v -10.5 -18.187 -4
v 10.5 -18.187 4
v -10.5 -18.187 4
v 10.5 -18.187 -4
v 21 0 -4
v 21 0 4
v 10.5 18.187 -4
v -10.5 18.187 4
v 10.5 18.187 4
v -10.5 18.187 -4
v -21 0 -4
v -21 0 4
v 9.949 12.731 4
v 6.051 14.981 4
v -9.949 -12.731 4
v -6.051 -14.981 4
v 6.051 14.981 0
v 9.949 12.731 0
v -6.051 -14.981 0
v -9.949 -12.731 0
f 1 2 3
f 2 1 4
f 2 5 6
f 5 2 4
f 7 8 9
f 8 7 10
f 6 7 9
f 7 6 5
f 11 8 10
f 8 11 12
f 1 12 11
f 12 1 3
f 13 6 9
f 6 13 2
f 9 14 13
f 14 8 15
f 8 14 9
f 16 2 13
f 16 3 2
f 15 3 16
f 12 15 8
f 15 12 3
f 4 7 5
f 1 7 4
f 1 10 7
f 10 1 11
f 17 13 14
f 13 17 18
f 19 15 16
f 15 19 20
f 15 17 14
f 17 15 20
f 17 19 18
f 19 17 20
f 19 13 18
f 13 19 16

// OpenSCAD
difference() {
	translate(v = [0, 0, 0]) {
		rotate(a = [0, 0, 0]) {
			cylinder($fn = 6, center = true, h = 8, r1 = 21, r2 = 21);
		}
	}
	translate(v = [0, 0, 4.0000000000]) {
		rotate(a = [0, 0, 60]) {
			cube(center = true, size = [32.0000000000, 4.5000000000, 8]);
		}
	}
}
/***********************************************
*********      SolidPython code:      **********
************************************************
 
__author__ = 'Mark Weinreuter'

from config import *

cut = C(mirror_slit_width +.5, mirror_thickness+.5, block_base_h_mm)
cut.rz = 90
cut.z = block_base_h_mm / 2
base = make_base()

mir_tile1 = base - cut
cut.rz = 60
mir_tile2 = base - cut

scad_render_to_file(mir_tile1, "scad/mirror_tile1.scad")
scad_render_to_file(mir_tile2, "scad/mirror_tile2.scad")

# holes_rots = (60, 60 + 180, 60 + 90, (60 + 90 + 180))
# holes = []
# for rot in holes_rots:
#    holes.append(
#        up(block_base_h_mm / 2)(rotate([0, 0, rot])(left(connector_dist_mm)(cylinder(connector_r_mm, h=block_base_h_mm, center=True, segments=256)))))


cable_hole = cylinder(cable_r_mm, h=block_base_h_mm * 10, center=True)
# base -= cable_hole
# for h in holes:
#    base -= h

turret_w = 30
turret_height = 50
turret_th = 10
t = cube([turret_w, turret_w, turret_height], center=True)
t_cutout = cube([turret_w - 2 * turret_th, turret_w, turret_height], center=True)
t -= translate([0, turret_th, -turret_th])(t_cutout)

scad_render_to_file(t, "scad/block_turret.scad")
 
 
************************************************/
